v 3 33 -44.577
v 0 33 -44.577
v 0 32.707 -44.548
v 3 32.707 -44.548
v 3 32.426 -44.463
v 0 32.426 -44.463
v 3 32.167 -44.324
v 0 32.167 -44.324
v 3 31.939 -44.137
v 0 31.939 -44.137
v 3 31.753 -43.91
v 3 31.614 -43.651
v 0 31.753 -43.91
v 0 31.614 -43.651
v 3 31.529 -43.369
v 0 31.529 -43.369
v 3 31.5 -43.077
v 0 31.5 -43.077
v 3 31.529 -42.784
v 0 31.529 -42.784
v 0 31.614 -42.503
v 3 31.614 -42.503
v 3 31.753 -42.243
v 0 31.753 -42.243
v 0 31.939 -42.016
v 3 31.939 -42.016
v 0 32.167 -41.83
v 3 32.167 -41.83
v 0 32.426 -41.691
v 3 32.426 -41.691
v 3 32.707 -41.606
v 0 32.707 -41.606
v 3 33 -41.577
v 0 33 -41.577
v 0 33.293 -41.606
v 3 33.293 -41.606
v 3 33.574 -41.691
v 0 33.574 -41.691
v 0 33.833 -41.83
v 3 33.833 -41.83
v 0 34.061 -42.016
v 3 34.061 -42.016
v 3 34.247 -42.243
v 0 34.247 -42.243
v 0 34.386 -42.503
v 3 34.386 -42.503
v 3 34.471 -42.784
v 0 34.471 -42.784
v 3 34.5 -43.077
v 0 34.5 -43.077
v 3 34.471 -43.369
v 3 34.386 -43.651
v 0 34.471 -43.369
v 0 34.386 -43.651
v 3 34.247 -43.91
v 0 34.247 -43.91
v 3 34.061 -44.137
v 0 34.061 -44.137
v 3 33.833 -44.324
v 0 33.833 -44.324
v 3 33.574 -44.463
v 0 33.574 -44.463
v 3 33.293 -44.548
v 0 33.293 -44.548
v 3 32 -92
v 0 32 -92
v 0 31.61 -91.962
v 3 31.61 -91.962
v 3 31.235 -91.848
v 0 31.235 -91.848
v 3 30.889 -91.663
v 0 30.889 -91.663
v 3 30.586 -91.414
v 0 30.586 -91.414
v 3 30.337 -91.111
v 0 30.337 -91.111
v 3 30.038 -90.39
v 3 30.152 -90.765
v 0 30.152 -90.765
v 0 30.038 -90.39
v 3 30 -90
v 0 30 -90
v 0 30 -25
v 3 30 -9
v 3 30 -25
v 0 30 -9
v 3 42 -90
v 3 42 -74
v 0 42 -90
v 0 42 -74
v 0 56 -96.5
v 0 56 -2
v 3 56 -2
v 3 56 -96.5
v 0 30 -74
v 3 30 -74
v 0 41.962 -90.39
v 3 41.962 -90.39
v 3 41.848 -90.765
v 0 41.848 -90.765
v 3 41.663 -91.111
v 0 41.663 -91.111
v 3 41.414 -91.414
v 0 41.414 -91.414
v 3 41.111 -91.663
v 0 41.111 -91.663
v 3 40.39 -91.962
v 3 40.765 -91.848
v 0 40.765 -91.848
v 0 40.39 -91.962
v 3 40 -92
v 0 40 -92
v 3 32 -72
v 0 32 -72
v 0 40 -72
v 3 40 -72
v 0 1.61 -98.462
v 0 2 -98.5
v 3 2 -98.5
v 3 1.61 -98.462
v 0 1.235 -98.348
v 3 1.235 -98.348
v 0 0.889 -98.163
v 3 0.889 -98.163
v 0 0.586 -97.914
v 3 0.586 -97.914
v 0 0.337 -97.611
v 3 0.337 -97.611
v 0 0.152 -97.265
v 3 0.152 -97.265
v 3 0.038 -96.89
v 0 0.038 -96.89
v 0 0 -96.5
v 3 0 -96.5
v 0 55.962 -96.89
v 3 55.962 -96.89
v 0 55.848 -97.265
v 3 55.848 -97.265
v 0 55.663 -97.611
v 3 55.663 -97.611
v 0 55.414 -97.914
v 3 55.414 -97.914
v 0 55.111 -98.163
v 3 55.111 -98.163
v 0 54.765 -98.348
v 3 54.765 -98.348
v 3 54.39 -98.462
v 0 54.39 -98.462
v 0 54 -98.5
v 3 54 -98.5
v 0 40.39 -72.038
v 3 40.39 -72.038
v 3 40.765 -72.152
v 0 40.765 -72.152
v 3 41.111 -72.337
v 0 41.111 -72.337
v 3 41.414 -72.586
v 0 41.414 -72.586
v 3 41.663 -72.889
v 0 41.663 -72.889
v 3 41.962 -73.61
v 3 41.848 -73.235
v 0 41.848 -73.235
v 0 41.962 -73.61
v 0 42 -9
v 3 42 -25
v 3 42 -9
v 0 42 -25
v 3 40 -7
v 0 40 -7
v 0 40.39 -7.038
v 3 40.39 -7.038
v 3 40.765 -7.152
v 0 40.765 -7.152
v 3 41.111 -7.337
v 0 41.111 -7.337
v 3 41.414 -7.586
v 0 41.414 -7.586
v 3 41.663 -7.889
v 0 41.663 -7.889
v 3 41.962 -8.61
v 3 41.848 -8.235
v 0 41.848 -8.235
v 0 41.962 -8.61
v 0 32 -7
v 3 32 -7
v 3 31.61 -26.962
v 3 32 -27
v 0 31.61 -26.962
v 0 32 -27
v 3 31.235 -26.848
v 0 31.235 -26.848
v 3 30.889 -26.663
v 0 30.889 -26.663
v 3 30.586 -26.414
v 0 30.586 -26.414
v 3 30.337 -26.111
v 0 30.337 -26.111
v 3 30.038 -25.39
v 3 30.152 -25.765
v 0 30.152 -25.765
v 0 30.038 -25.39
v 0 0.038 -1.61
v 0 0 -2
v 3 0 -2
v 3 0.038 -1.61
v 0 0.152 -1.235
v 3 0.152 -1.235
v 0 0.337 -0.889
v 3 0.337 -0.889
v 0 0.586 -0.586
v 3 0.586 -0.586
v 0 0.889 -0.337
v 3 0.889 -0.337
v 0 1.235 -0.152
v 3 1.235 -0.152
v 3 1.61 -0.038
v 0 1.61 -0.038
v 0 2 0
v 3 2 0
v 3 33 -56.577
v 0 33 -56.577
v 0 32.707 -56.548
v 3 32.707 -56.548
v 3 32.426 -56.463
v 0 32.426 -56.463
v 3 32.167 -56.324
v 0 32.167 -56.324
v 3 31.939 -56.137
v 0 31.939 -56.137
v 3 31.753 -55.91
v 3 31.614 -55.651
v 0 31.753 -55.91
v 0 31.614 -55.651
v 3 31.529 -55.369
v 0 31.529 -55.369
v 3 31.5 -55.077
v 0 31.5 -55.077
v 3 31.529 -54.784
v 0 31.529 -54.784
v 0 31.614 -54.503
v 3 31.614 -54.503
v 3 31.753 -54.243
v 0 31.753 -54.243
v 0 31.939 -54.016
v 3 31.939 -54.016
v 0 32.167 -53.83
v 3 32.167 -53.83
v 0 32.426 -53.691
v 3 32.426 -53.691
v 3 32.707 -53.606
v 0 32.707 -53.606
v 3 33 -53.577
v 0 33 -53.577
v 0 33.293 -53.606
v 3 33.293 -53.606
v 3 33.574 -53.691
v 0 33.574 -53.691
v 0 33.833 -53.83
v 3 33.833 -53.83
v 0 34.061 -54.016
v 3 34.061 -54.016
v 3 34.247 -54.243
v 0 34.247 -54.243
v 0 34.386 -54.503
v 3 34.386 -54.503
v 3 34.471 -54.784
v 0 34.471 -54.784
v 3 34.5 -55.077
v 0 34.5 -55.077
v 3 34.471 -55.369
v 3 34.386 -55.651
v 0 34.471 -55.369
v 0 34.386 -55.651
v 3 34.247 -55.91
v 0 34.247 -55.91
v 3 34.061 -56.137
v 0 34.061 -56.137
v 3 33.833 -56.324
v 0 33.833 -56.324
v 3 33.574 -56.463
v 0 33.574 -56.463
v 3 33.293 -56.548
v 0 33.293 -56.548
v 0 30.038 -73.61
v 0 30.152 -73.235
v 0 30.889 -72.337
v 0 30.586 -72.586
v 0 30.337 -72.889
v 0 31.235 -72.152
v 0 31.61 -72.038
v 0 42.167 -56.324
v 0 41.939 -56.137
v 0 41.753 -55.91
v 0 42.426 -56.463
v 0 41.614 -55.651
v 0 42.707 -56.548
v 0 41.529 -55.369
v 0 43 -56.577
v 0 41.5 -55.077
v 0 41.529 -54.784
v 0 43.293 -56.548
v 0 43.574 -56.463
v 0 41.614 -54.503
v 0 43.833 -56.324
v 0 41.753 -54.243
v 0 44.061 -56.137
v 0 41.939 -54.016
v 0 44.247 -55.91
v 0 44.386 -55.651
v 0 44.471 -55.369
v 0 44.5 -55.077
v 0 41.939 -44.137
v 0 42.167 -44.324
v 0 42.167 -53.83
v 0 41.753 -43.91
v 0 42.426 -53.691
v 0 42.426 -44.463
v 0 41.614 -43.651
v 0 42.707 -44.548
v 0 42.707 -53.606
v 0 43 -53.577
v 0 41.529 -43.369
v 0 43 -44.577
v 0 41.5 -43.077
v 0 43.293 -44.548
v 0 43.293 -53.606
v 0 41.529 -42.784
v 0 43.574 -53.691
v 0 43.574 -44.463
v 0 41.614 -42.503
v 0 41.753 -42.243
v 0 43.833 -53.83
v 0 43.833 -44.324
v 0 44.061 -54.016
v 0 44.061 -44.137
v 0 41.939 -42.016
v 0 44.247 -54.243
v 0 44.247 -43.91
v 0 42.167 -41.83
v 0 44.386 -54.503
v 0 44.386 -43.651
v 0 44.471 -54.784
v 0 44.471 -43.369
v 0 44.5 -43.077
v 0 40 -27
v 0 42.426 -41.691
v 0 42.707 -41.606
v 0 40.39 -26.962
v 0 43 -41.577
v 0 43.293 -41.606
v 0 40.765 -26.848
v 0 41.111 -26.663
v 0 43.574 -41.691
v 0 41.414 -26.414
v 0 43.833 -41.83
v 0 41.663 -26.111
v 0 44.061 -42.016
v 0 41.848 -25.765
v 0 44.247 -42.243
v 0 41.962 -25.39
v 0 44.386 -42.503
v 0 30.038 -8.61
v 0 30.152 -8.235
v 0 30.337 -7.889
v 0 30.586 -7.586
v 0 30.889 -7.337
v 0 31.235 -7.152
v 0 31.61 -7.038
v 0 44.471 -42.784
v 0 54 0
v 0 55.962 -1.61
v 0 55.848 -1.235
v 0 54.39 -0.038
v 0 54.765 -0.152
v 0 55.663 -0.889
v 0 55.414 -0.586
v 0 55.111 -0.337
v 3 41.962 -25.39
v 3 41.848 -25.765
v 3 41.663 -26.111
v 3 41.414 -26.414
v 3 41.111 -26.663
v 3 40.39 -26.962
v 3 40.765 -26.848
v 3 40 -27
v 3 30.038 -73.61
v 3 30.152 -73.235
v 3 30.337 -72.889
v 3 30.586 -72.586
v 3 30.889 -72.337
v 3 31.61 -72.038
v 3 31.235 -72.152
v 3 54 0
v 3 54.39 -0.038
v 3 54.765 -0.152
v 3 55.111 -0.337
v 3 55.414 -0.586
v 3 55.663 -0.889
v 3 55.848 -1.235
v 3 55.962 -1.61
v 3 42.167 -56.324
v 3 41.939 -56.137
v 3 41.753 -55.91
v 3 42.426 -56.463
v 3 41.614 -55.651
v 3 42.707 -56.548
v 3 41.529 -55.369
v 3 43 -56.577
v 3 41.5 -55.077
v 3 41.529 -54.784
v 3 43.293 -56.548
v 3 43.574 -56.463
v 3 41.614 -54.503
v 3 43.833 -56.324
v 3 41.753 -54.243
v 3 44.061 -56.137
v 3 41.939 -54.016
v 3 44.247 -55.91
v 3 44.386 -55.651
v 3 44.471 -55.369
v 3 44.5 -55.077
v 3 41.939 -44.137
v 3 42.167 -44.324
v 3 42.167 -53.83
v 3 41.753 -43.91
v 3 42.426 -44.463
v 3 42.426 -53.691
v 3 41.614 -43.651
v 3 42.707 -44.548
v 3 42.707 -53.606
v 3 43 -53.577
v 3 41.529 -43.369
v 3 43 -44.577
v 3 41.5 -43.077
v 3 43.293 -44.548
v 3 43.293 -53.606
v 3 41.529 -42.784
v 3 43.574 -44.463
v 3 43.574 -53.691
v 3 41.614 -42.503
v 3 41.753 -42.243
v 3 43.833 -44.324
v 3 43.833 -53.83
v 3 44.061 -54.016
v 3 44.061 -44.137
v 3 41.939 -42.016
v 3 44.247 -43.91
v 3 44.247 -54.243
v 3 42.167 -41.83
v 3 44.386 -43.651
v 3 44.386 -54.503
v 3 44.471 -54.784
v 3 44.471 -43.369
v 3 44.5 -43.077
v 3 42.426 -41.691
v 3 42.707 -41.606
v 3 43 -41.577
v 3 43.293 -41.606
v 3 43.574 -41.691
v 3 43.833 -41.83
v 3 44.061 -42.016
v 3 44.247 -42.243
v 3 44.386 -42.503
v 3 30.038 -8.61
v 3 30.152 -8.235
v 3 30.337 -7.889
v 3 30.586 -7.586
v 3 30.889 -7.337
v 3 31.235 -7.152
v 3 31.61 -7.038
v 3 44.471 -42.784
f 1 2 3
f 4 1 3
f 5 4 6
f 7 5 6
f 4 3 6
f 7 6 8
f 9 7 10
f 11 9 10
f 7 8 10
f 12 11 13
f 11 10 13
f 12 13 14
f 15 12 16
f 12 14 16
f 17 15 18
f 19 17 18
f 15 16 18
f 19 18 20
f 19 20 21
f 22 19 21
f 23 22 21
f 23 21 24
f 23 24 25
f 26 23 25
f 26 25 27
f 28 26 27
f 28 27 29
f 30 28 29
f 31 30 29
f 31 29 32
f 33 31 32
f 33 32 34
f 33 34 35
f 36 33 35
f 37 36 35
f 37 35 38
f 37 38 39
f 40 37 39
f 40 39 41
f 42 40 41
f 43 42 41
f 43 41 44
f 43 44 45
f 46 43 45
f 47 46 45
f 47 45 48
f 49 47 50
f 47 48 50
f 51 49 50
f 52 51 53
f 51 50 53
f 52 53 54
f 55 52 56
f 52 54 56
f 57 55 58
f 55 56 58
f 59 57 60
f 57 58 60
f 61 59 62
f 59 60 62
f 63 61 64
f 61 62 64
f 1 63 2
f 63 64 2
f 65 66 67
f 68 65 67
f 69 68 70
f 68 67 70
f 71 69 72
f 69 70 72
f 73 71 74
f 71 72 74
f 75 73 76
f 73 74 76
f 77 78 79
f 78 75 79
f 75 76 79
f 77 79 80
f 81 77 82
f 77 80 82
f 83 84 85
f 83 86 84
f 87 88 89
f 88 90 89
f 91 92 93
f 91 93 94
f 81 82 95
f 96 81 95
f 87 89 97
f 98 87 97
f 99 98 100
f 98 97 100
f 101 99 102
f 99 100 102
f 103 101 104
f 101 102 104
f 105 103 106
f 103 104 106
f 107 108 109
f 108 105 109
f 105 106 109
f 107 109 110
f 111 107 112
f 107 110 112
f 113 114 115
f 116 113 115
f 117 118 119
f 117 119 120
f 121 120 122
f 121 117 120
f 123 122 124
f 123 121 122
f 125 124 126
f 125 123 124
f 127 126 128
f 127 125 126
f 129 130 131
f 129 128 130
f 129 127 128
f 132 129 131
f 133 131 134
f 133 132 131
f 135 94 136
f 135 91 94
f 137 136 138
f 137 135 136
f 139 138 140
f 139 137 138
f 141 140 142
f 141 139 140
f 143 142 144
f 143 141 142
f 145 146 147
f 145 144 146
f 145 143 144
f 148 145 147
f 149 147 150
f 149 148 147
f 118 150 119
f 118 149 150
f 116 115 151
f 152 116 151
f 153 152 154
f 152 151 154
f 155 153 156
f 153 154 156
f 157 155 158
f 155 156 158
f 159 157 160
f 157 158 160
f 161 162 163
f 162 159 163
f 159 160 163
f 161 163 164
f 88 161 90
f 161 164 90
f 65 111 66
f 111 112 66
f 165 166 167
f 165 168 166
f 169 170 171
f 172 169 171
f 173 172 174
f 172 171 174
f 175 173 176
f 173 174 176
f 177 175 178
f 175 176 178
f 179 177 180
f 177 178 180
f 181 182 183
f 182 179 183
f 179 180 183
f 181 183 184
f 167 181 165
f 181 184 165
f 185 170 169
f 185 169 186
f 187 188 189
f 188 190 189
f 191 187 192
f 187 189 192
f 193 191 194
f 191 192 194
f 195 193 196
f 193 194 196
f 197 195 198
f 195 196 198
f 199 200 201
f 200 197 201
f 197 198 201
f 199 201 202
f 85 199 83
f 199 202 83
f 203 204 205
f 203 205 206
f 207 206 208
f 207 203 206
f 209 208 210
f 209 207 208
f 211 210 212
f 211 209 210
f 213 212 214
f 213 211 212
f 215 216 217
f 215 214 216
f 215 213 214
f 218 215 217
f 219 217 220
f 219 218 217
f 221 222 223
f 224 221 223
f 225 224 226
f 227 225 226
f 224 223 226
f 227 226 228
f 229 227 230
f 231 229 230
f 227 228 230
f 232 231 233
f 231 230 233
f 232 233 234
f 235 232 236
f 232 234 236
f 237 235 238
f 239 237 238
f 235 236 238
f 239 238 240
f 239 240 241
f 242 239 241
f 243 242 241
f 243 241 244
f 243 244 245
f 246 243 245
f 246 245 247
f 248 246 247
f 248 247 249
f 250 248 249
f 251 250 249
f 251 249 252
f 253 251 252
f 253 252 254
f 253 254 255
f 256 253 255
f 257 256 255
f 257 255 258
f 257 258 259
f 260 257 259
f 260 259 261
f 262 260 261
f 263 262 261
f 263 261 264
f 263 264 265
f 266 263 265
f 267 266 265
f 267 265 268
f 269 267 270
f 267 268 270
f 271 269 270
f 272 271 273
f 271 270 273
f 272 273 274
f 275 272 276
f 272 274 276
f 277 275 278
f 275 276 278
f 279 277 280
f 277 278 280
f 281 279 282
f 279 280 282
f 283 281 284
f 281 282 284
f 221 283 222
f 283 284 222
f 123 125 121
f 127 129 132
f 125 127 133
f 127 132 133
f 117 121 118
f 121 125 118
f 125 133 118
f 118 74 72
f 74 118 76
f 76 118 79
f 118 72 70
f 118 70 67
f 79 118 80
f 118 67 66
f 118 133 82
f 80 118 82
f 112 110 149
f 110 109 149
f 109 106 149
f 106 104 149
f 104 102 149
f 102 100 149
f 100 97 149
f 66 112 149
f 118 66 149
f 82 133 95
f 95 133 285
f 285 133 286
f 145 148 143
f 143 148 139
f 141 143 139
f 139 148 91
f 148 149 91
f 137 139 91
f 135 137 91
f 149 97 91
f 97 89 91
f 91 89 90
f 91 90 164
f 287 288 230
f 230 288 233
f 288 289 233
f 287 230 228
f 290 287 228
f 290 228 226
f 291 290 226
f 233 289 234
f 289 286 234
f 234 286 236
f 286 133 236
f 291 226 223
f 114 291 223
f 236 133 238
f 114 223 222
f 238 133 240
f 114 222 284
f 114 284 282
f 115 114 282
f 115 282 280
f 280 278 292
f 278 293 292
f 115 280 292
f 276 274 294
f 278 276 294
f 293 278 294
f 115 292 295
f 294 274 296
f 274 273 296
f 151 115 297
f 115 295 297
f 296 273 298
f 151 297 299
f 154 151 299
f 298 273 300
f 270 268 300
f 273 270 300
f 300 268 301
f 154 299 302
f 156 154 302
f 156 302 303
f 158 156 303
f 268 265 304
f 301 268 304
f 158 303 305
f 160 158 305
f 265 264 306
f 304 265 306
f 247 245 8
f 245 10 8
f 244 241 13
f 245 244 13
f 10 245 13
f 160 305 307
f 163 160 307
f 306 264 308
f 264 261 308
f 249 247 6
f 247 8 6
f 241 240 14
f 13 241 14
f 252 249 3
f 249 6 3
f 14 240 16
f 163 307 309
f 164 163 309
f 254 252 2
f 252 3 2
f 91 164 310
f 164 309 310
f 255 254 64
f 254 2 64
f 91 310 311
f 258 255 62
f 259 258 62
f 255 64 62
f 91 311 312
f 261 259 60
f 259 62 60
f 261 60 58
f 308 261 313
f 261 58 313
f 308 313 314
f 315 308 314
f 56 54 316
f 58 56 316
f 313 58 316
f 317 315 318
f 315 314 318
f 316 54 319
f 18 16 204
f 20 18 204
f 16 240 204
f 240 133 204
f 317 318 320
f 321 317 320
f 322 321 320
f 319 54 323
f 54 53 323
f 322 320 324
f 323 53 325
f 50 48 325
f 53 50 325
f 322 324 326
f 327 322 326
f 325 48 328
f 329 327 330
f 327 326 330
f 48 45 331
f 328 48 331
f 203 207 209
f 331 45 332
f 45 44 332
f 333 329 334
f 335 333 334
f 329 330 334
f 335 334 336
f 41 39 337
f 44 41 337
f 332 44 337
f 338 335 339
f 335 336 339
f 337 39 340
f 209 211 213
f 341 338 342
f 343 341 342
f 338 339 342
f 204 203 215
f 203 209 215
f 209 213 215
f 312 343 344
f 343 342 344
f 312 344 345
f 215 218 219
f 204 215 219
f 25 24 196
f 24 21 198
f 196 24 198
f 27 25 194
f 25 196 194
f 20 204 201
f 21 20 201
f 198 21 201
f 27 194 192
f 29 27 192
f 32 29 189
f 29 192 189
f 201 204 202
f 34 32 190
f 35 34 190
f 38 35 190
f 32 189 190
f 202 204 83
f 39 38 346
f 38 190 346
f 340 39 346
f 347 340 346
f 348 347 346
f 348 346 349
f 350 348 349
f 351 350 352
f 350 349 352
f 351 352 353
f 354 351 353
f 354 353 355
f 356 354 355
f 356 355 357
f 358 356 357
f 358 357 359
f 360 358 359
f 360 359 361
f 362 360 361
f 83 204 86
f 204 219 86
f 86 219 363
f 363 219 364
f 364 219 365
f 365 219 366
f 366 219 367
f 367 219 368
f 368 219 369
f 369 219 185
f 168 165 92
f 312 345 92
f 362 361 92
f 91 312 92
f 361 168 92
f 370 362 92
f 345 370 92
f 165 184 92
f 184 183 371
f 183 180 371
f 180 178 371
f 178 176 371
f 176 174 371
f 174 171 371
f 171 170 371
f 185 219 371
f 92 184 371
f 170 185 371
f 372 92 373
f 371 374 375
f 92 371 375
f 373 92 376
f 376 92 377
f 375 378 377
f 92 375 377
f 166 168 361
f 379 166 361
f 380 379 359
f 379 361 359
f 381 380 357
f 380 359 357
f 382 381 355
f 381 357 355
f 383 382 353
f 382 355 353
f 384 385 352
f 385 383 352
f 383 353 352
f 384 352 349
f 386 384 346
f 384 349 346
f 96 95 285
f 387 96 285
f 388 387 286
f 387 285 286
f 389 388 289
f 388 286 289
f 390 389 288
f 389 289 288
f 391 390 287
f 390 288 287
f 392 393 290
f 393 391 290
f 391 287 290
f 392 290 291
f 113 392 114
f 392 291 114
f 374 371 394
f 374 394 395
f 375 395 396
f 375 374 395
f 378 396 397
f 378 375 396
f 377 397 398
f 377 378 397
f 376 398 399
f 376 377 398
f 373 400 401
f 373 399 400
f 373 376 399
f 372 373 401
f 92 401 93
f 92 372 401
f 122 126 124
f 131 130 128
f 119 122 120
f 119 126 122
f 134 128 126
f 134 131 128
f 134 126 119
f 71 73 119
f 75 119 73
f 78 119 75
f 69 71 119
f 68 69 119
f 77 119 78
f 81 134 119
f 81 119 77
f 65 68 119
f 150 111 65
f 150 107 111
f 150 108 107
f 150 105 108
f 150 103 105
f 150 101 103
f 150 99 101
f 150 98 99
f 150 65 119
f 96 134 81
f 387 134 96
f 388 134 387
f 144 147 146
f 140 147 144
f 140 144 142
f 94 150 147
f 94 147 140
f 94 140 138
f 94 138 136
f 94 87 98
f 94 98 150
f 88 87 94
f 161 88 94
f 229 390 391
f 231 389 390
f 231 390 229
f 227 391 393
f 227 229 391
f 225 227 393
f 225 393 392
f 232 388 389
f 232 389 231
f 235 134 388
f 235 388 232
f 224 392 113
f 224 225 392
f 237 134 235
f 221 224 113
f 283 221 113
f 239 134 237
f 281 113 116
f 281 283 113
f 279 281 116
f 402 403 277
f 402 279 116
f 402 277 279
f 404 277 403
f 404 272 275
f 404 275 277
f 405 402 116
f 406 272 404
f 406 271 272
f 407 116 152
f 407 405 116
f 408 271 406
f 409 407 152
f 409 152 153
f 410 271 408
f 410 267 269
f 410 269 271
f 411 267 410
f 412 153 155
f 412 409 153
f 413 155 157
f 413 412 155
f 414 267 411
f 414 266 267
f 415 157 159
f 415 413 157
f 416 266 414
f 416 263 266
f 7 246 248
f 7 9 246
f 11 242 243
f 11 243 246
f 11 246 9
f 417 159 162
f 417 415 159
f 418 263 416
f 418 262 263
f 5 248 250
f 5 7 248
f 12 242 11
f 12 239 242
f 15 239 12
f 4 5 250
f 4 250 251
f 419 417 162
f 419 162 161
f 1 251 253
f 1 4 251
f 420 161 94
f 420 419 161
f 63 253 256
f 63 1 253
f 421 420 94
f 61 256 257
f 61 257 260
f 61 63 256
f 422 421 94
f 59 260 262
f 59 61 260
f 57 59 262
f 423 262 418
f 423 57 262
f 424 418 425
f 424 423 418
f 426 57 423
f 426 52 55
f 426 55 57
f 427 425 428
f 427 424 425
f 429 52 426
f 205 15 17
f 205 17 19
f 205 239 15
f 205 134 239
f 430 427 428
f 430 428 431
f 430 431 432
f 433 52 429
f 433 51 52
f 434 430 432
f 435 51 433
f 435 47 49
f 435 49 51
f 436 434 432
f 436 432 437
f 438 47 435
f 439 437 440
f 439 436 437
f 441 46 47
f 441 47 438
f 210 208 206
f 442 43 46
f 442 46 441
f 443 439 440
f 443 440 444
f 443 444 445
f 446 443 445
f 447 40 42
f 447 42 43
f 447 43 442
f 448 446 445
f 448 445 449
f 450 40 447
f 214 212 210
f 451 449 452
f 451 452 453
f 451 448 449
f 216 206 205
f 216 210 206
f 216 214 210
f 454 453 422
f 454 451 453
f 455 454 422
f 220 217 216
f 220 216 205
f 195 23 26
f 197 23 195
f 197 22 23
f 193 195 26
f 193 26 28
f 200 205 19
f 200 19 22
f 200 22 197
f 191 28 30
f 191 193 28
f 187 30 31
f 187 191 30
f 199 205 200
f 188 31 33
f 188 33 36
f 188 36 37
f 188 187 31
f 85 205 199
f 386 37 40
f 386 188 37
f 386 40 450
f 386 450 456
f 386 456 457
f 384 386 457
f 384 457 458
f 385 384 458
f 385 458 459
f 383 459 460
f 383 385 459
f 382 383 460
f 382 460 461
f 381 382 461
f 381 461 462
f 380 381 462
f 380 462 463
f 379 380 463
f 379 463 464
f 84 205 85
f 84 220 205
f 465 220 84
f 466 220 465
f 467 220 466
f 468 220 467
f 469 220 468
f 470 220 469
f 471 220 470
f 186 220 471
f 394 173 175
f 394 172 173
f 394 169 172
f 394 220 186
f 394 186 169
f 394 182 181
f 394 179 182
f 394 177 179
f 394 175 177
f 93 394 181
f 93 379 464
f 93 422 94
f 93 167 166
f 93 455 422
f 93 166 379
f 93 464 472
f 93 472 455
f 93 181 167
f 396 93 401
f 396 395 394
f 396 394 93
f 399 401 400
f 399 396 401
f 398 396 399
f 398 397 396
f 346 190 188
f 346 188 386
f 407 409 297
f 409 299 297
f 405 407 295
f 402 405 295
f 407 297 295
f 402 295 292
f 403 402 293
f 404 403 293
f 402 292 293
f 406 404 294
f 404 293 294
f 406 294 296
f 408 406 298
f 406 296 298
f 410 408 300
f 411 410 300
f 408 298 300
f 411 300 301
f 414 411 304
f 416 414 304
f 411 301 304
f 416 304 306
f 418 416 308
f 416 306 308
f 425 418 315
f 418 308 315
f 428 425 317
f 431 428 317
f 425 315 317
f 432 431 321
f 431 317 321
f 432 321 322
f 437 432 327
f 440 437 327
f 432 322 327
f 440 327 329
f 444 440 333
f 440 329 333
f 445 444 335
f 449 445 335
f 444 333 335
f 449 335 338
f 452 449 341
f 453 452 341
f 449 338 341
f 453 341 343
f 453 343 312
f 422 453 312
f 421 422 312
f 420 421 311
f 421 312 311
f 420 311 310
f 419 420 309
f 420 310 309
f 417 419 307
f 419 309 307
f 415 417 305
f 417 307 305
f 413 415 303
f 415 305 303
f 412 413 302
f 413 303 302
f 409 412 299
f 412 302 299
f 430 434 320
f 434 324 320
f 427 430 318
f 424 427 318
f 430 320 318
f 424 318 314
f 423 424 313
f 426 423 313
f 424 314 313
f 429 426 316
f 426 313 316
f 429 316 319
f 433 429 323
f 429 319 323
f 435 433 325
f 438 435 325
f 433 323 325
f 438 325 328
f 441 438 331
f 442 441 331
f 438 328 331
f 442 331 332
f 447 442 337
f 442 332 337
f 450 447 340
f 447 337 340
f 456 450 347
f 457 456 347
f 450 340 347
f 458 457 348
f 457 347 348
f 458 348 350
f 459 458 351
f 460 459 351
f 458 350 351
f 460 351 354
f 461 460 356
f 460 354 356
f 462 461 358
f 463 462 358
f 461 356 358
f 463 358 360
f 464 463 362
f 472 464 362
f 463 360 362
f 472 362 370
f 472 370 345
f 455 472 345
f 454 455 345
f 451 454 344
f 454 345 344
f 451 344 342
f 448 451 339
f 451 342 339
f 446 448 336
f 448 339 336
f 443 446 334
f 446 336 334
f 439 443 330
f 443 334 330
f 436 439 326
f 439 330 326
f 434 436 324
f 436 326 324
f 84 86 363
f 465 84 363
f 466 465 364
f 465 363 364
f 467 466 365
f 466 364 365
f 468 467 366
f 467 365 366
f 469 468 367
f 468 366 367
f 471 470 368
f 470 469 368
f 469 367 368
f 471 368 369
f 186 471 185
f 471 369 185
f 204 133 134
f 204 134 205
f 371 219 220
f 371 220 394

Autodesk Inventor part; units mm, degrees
ref_plane "YZ Plane" through (0, 0, 0) normal (1, 0, 0) x (0, 1, 0)
ref_plane "XZ Plane" through (0, 0, 0) normal (0, 1, 0) x (-1, 0, 0)
ref_plane "XY Plane" through (0, 0, 0) normal (0, 0, 1) x (1, 0, 0)
sketch "Sketch1" plane through (0, 0, 0) normal (1, 0, 0) x (0, 1, 0)
  line L0 (2, 0) -> (54, 0)
  line L1 (56, -2) -> (56, -96.5)
  line L2 (54, -98.5) -> (2, -98.5)
  line L3 (0, -96.5) -> (0, -2)
  line L4 (40, -7) -> (32, -7)
  line L5 (30, -9) -> (30, -25)
  line L6 (32, -27) -> (40, -27)
  line L7 (42, -25) -> (42, -9)
  arc A0 (40, -27) -> (42, -25) centre (40, -25) ccw
  arc A1 (32, -7) -> (30, -9) centre (32, -9) ccw
  arc A2 (30, -25) -> (32, -27) centre (32, -25) ccw
  arc A3 (42, -9) -> (40, -7) centre (40, -9) ccw
  line L8 (0, -49.5) -> (56, -49.5)
  line L9 (40, -92) -> (32, -92)
  line L10 (30, -90) -> (30, -74)
  line L11 (32, -72) -> (40, -72)
  line L12 (42, -74) -> (42, -90)
  arc A4 (42, -74) -> (40, -72) centre (40, -74) ccw
  arc A5 (30, -90) -> (32, -92) centre (32, -90) ccw
  arc A6 (32, -72) -> (30, -74) centre (32, -74) ccw
  arc A7 (40, -92) -> (42, -90) centre (40, -90) ccw
  arc A8 (56, -2) -> (54, 0) centre (54, -2) ccw
  arc A9 (54, -98.5) -> (56, -96.5) centre (54, -96.5) ccw
  arc A10 (0, -96.5) -> (2, -98.5) centre (2, -96.5) ccw
  arc A11 (2, 0) -> (0, -2) centre (2, -2) ccw
  point P0 (0, 0)
  point P1 (56, -98.5)
  point P2 (56, 0)
  point P3 (0, -98.5)
  point P4 (42, -7)
  point P5 (30, -27)
  point P6 (42, -27)
  point P7 (42, -92)
  point P8 (30, -72)
  point P9 (42, -72)
  dimension "d0" = 56
  dimension "d1" = 98.5
  dimension "d2" = 7
  dimension "d3" = 30
  dimension "d4" = 12
  dimension "d5" = 20
  dimension "d6" = 2
  dimension "d7" = 49.5
  dimension "d10" = 2
extrude "Extrusion1" add sketch "Sketch1" along normal blind 3
sketch "Boceto2" plane through (3, 0, 0) normal (1, 0, 0) x (0, 0, -1)
  circle A0 centre (43.0768, 43) radius 1.5 construction
  circle A1 centre (55.0768, 43) radius 1.5 construction
  circle A2 centre (43.0768, 33) radius 1.5 construction
  circle A3 centre (55.0768, 33) radius 1.5 construction
  point P0 (0, 0)
hole "SpacersSetHerramientas" at (3, 43, -43.0768) at (3, 33, -43.0768) at (3, 33, -55.0768) at (3, 43, -55.0768) direction (-1, 0, 0) diameter 3 end through all
properties part number "PARED FRONTAL"
